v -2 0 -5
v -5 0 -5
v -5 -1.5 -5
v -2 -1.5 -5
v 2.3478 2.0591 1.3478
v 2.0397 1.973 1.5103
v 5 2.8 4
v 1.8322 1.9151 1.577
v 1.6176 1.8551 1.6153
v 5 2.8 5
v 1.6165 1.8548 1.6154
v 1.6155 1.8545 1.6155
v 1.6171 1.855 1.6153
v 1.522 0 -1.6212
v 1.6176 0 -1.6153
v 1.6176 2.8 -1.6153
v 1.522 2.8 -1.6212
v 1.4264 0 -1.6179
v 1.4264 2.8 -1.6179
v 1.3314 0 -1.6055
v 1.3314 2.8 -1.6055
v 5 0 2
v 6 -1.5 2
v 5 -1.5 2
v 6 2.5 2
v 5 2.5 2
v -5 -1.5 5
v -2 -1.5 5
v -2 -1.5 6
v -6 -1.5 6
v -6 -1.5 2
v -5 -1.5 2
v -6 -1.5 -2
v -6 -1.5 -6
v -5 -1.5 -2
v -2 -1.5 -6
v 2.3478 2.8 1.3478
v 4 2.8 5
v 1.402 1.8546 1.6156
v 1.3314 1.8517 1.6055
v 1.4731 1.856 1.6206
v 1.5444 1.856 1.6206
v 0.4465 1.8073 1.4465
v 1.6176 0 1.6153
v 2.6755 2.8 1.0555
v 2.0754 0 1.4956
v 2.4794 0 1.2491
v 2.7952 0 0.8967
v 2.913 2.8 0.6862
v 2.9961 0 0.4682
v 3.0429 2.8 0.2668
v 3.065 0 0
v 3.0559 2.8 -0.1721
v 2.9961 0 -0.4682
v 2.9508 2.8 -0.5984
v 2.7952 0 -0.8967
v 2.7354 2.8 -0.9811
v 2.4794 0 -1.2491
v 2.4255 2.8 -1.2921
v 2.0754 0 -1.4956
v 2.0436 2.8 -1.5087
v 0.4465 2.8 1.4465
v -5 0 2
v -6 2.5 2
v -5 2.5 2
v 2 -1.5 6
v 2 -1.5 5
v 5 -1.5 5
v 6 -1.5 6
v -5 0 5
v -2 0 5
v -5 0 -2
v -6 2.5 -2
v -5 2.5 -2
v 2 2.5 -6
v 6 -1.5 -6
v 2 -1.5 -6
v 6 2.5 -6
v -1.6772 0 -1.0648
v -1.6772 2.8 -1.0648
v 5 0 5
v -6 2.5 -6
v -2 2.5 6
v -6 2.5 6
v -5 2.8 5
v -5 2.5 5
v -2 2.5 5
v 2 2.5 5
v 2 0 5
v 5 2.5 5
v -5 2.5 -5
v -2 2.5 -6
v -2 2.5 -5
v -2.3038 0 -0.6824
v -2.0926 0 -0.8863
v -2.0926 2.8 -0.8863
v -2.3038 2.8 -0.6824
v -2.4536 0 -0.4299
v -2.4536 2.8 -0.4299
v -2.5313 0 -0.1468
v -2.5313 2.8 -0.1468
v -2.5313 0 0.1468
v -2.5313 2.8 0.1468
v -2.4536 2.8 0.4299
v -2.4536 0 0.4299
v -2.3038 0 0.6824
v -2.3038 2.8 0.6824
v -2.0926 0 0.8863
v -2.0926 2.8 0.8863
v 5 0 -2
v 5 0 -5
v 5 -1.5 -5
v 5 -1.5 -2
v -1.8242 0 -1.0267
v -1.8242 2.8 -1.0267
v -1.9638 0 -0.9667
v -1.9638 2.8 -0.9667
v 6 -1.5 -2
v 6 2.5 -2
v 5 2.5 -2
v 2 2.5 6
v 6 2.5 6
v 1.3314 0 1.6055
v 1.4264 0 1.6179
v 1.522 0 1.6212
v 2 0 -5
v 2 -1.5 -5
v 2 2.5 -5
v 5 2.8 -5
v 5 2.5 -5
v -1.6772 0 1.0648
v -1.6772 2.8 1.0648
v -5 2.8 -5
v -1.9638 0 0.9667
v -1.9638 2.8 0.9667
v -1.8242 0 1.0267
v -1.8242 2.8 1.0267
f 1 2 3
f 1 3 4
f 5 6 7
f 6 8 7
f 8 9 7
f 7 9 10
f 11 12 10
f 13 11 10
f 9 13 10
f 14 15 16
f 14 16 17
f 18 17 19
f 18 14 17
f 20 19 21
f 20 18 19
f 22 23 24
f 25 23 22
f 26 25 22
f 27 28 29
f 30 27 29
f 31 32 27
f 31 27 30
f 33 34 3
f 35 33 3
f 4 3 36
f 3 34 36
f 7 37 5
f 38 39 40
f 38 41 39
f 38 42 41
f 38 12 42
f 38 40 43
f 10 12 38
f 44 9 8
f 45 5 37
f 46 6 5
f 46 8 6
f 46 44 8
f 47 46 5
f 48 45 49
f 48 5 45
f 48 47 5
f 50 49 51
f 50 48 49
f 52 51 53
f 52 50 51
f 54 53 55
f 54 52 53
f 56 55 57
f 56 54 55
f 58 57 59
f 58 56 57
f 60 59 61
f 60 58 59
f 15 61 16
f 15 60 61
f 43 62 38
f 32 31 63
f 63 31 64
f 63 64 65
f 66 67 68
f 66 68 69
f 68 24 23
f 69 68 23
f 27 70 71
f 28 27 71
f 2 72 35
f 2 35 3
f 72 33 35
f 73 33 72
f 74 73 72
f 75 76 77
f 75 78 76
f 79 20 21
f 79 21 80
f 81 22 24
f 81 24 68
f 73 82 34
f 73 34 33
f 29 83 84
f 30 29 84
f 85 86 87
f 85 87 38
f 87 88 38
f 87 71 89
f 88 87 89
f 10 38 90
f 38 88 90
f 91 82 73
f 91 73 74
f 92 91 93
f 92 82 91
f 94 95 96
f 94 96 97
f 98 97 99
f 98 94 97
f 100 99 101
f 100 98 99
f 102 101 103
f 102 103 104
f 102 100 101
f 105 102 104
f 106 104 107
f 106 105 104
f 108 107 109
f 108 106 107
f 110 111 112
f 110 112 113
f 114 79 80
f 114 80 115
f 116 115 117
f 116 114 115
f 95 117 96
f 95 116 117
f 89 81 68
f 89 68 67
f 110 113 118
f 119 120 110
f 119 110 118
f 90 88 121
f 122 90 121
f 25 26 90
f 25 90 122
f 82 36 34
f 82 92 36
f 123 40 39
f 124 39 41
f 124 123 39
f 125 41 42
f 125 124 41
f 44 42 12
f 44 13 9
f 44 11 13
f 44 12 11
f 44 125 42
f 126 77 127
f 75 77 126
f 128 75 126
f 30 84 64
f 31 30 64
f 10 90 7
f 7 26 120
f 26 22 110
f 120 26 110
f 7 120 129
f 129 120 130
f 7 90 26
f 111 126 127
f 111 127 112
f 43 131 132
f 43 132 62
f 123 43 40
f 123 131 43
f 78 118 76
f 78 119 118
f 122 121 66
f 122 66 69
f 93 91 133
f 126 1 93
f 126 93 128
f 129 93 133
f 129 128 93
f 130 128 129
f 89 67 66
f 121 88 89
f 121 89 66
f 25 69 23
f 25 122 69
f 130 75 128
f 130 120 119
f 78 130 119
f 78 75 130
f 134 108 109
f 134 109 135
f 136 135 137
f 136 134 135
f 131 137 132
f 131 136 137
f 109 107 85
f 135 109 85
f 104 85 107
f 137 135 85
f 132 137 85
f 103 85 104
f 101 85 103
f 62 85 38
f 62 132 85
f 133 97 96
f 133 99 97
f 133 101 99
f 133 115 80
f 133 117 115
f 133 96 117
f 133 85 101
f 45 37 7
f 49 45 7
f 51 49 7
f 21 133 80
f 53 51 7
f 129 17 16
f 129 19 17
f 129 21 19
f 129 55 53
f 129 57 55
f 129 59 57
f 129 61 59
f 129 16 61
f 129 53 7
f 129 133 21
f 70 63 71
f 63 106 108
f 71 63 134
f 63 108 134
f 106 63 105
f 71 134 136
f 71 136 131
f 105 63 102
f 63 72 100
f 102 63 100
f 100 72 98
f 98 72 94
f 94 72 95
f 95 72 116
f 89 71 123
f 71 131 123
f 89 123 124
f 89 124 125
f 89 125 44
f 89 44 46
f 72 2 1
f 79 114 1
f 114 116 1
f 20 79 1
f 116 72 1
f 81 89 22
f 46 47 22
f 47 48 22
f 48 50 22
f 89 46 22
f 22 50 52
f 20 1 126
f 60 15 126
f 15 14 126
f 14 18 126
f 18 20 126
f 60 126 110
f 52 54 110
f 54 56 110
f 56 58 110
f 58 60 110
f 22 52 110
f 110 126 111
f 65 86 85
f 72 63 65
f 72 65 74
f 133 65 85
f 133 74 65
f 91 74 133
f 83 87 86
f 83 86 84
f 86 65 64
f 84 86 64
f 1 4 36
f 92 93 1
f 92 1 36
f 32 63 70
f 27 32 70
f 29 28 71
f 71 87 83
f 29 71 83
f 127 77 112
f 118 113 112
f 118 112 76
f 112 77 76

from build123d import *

# Parameters (mm, degrees)
BOSS_EXTRUDE2_DEPTH   = 2.5
BOSS_EXTRUDE2_2_DEPTH = 2.5
BOSS_EXTRUDE2_3_DEPTH = 2.5
BOSS_EXTRUDE2_4_DEPTH = 2.5
BOSS_EXTRUDE3_DEPTH   = 1.5
SKETCH1_W             = 10
SKETCH1_H             = 10
BOSS_EXTRUDE4_DEPTH   = 2.8
CUT_EXTRUDE11_DEPTH   = 1
CUT_EXTRUDE14_DEPTH   = 1


with BuildPart() as part:
    # Sketch2 → Boss-Extrude2 (new body)
    with BuildSketch(Plane(origin=(0, 0, 0), x_dir=(1, 0, 0), z_dir=(0, 1, 0))):
        Polygon((-2, 6), (-6, 6), (-6, 2), (-5, 2), (-5, 5), (-2, 5), align=None)
    extrude(amount=BOSS_EXTRUDE2_DEPTH)



with BuildPart() as body_2:
    # Sketch2 → Boss-Extrude2 2 (new body)
    with BuildSketch(Plane(origin=(0, 0, 0), x_dir=(1, 0, 0), z_dir=(0, 1, 0))):
        Polygon((2, 6), (2, 5), (5, 5), (5, 2), (6, 2), (6, 6), align=None)
    extrude(amount=BOSS_EXTRUDE2_2_DEPTH)


with BuildPart() as body_3:
    # Sketch2 → Boss-Extrude2 3 (new body)
    with BuildSketch(Plane(origin=(0, 0, 0), x_dir=(1, 0, 0), z_dir=(0, 1, 0))):
        Polygon((5, -2), (5, -5), (2, -5), (2, -6), (6, -6), (6, -2), align=None)
    extrude(amount=BOSS_EXTRUDE2_3_DEPTH)


with BuildPart() as body_4:
    # Sketch2 → Boss-Extrude2 4 (new body)
    with BuildSketch(Plane(origin=(0, 0, 0), x_dir=(1, 0, 0), z_dir=(0, 1, 0))):
        Polygon((-6, -2), (-5, -2), (-5, -5), (-2, -5), (-2, -6), (-6, -6), align=None)
    extrude(amount=BOSS_EXTRUDE2_4_DEPTH)

    # Sketch2<4> → Boss-Extrude3 (add)
    with BuildSketch(Plane(origin=(0, 0, 0), x_dir=(1, 0, 0), z_dir=(0, 1, 0))):
        Polygon((-2, 6), (-6, 6), (-6, 2), (-5, 2), (-5, 5), (-2, 5), align=None)
        Polygon((2, 6), (2, 5), (5, 5), (5, 2), (6, 2), (6, 6), align=None)
        Polygon((5, -2), (5, -5), (2, -5), (2, -6), (6, -6), (6, -2), align=None)
        Polygon((-6, -2), (-5, -2), (-5, -5), (-2, -5), (-2, -6), (-6, -6), align=None)
    extrude(amount=-BOSS_EXTRUDE3_DEPTH)


with BuildPart() as boss_extrude3_piece_1:
    # of the separate pieces the step leaves, piece 1, a body of its own (boss_extrude3_pieces)
    add(body_4.part.solids().sort_by_distance((-6, 2.5, 2))[0])


with BuildPart() as boss_extrude3_piece_2:
    # of the separate pieces the step leaves, piece 2, a body of its own (boss_extrude3_pieces)
    add(body_4.part.solids().sort_by_distance((-2, 0, -6))[0])


with BuildPart() as boss_extrude3_piece_3:
    # of the separate pieces the step leaves, piece 3, a body of its own (boss_extrude3_pieces)
    add(body_4.part.solids().sort_by_distance((2, 0, -6))[0])


with BuildPart() as boss_extrude3_piece_4:
    # of the separate pieces the step leaves, piece 4, a body of its own (boss_extrude3_pieces)
    add(body_4.part.solids().sort_by_distance((5, 0, 2))[0])


with BuildPart() as part_1:
    add(part.part)

    add(body_2.part)  # Boss-Extrude4 merges body 2

    add(body_3.part)  # Boss-Extrude4 merges body 3

    add(boss_extrude3_piece_1.part)  # Boss-Extrude4 merges Boss-Extrude3 piece 1

    add(boss_extrude3_piece_2.part)  # Boss-Extrude4 merges Boss-Extrude3 piece 2

    add(boss_extrude3_piece_3.part)  # Boss-Extrude4 merges Boss-Extrude3 piece 3

    add(boss_extrude3_piece_4.part)  # Boss-Extrude4 merges Boss-Extrude3 piece 4
    # Sketch1 → Boss-Extrude4 (add)
    with BuildSketch(Plane(origin=(0, 0, 0), x_dir=(1, 0, 0), z_dir=(0, 1, 0))):
        Rectangle(SKETCH1_W, SKETCH1_H)
        with BuildLine():
            ThreePointArc((1.617598637, -1.615265837), (3.065, 0), (1.617598637, 1.615265837))
            ThreePointArc((1.617598637, 1.615265837), (1.474163525, 1.620673027), (1.331431871, 1.605489361))
            Line((1.331431871, 1.605489361), (-1.677221968, 1.064808042))
            ThreePointArc((-1.677221968, 1.064808042), (-1.895132853, 0.999347796), (-2.092605578, 0.886322491))
            ThreePointArc((-2.092605578, 0.886322491), (-2.54112078, 0), (-2.092605578, -0.886322491))
            ThreePointArc((-2.092605578, -0.886322491), (-1.895132853, -0.999347796), (-1.677221968, -1.064808042))
            Line((-1.677221968, -1.064808042), (1.331431871, -1.605489361))
            ThreePointArc((1.331431871, -1.605489361), (1.474163525, -1.620673027), (1.617598637, -1.615265837))
        make_face(mode=Mode.SUBTRACT)
    extrude(amount=BOSS_EXTRUDE4_DEPTH)

    # 3DSketch1 → Cut-Extrude11 (cut, along a direction that is not the sketch's normal)
    with BuildSketch(Plane(origin=(5, 2.8, 5), x_dir=(-0.693702510890827, -0.1937876486453734, -0.6937025108908424), z_dir=(0.7071067811865555, 0, -0.7071067811865397))):
        Polygon((0, 0), (-0.732362778, 3.707562105), (7.206933902, 0), align=None)
    extrude(amount=-CUT_EXTRUDE11_DEPTH, dir=(1, 0, 0), mode=Mode.SUBTRACT)

    # 3DSketch1<9> → Cut-Extrude14 (cut, along a direction that is not the sketch's normal)
    with BuildSketch(Plane(origin=(5, 2.8, 5), x_dir=(-0.693702510890827, -0.1937876486453734, -0.6937025108908424), z_dir=(0.7071067811865555, 0, -0.7071067811865397))):
        Polygon((0, 0), (-0.732362778, 3.707562105), (7.206933902, 0), align=None)
    extrude(amount=CUT_EXTRUDE14_DEPTH, dir=(0, 0, -1), mode=Mode.SUBTRACT)


solid = part_1.part
